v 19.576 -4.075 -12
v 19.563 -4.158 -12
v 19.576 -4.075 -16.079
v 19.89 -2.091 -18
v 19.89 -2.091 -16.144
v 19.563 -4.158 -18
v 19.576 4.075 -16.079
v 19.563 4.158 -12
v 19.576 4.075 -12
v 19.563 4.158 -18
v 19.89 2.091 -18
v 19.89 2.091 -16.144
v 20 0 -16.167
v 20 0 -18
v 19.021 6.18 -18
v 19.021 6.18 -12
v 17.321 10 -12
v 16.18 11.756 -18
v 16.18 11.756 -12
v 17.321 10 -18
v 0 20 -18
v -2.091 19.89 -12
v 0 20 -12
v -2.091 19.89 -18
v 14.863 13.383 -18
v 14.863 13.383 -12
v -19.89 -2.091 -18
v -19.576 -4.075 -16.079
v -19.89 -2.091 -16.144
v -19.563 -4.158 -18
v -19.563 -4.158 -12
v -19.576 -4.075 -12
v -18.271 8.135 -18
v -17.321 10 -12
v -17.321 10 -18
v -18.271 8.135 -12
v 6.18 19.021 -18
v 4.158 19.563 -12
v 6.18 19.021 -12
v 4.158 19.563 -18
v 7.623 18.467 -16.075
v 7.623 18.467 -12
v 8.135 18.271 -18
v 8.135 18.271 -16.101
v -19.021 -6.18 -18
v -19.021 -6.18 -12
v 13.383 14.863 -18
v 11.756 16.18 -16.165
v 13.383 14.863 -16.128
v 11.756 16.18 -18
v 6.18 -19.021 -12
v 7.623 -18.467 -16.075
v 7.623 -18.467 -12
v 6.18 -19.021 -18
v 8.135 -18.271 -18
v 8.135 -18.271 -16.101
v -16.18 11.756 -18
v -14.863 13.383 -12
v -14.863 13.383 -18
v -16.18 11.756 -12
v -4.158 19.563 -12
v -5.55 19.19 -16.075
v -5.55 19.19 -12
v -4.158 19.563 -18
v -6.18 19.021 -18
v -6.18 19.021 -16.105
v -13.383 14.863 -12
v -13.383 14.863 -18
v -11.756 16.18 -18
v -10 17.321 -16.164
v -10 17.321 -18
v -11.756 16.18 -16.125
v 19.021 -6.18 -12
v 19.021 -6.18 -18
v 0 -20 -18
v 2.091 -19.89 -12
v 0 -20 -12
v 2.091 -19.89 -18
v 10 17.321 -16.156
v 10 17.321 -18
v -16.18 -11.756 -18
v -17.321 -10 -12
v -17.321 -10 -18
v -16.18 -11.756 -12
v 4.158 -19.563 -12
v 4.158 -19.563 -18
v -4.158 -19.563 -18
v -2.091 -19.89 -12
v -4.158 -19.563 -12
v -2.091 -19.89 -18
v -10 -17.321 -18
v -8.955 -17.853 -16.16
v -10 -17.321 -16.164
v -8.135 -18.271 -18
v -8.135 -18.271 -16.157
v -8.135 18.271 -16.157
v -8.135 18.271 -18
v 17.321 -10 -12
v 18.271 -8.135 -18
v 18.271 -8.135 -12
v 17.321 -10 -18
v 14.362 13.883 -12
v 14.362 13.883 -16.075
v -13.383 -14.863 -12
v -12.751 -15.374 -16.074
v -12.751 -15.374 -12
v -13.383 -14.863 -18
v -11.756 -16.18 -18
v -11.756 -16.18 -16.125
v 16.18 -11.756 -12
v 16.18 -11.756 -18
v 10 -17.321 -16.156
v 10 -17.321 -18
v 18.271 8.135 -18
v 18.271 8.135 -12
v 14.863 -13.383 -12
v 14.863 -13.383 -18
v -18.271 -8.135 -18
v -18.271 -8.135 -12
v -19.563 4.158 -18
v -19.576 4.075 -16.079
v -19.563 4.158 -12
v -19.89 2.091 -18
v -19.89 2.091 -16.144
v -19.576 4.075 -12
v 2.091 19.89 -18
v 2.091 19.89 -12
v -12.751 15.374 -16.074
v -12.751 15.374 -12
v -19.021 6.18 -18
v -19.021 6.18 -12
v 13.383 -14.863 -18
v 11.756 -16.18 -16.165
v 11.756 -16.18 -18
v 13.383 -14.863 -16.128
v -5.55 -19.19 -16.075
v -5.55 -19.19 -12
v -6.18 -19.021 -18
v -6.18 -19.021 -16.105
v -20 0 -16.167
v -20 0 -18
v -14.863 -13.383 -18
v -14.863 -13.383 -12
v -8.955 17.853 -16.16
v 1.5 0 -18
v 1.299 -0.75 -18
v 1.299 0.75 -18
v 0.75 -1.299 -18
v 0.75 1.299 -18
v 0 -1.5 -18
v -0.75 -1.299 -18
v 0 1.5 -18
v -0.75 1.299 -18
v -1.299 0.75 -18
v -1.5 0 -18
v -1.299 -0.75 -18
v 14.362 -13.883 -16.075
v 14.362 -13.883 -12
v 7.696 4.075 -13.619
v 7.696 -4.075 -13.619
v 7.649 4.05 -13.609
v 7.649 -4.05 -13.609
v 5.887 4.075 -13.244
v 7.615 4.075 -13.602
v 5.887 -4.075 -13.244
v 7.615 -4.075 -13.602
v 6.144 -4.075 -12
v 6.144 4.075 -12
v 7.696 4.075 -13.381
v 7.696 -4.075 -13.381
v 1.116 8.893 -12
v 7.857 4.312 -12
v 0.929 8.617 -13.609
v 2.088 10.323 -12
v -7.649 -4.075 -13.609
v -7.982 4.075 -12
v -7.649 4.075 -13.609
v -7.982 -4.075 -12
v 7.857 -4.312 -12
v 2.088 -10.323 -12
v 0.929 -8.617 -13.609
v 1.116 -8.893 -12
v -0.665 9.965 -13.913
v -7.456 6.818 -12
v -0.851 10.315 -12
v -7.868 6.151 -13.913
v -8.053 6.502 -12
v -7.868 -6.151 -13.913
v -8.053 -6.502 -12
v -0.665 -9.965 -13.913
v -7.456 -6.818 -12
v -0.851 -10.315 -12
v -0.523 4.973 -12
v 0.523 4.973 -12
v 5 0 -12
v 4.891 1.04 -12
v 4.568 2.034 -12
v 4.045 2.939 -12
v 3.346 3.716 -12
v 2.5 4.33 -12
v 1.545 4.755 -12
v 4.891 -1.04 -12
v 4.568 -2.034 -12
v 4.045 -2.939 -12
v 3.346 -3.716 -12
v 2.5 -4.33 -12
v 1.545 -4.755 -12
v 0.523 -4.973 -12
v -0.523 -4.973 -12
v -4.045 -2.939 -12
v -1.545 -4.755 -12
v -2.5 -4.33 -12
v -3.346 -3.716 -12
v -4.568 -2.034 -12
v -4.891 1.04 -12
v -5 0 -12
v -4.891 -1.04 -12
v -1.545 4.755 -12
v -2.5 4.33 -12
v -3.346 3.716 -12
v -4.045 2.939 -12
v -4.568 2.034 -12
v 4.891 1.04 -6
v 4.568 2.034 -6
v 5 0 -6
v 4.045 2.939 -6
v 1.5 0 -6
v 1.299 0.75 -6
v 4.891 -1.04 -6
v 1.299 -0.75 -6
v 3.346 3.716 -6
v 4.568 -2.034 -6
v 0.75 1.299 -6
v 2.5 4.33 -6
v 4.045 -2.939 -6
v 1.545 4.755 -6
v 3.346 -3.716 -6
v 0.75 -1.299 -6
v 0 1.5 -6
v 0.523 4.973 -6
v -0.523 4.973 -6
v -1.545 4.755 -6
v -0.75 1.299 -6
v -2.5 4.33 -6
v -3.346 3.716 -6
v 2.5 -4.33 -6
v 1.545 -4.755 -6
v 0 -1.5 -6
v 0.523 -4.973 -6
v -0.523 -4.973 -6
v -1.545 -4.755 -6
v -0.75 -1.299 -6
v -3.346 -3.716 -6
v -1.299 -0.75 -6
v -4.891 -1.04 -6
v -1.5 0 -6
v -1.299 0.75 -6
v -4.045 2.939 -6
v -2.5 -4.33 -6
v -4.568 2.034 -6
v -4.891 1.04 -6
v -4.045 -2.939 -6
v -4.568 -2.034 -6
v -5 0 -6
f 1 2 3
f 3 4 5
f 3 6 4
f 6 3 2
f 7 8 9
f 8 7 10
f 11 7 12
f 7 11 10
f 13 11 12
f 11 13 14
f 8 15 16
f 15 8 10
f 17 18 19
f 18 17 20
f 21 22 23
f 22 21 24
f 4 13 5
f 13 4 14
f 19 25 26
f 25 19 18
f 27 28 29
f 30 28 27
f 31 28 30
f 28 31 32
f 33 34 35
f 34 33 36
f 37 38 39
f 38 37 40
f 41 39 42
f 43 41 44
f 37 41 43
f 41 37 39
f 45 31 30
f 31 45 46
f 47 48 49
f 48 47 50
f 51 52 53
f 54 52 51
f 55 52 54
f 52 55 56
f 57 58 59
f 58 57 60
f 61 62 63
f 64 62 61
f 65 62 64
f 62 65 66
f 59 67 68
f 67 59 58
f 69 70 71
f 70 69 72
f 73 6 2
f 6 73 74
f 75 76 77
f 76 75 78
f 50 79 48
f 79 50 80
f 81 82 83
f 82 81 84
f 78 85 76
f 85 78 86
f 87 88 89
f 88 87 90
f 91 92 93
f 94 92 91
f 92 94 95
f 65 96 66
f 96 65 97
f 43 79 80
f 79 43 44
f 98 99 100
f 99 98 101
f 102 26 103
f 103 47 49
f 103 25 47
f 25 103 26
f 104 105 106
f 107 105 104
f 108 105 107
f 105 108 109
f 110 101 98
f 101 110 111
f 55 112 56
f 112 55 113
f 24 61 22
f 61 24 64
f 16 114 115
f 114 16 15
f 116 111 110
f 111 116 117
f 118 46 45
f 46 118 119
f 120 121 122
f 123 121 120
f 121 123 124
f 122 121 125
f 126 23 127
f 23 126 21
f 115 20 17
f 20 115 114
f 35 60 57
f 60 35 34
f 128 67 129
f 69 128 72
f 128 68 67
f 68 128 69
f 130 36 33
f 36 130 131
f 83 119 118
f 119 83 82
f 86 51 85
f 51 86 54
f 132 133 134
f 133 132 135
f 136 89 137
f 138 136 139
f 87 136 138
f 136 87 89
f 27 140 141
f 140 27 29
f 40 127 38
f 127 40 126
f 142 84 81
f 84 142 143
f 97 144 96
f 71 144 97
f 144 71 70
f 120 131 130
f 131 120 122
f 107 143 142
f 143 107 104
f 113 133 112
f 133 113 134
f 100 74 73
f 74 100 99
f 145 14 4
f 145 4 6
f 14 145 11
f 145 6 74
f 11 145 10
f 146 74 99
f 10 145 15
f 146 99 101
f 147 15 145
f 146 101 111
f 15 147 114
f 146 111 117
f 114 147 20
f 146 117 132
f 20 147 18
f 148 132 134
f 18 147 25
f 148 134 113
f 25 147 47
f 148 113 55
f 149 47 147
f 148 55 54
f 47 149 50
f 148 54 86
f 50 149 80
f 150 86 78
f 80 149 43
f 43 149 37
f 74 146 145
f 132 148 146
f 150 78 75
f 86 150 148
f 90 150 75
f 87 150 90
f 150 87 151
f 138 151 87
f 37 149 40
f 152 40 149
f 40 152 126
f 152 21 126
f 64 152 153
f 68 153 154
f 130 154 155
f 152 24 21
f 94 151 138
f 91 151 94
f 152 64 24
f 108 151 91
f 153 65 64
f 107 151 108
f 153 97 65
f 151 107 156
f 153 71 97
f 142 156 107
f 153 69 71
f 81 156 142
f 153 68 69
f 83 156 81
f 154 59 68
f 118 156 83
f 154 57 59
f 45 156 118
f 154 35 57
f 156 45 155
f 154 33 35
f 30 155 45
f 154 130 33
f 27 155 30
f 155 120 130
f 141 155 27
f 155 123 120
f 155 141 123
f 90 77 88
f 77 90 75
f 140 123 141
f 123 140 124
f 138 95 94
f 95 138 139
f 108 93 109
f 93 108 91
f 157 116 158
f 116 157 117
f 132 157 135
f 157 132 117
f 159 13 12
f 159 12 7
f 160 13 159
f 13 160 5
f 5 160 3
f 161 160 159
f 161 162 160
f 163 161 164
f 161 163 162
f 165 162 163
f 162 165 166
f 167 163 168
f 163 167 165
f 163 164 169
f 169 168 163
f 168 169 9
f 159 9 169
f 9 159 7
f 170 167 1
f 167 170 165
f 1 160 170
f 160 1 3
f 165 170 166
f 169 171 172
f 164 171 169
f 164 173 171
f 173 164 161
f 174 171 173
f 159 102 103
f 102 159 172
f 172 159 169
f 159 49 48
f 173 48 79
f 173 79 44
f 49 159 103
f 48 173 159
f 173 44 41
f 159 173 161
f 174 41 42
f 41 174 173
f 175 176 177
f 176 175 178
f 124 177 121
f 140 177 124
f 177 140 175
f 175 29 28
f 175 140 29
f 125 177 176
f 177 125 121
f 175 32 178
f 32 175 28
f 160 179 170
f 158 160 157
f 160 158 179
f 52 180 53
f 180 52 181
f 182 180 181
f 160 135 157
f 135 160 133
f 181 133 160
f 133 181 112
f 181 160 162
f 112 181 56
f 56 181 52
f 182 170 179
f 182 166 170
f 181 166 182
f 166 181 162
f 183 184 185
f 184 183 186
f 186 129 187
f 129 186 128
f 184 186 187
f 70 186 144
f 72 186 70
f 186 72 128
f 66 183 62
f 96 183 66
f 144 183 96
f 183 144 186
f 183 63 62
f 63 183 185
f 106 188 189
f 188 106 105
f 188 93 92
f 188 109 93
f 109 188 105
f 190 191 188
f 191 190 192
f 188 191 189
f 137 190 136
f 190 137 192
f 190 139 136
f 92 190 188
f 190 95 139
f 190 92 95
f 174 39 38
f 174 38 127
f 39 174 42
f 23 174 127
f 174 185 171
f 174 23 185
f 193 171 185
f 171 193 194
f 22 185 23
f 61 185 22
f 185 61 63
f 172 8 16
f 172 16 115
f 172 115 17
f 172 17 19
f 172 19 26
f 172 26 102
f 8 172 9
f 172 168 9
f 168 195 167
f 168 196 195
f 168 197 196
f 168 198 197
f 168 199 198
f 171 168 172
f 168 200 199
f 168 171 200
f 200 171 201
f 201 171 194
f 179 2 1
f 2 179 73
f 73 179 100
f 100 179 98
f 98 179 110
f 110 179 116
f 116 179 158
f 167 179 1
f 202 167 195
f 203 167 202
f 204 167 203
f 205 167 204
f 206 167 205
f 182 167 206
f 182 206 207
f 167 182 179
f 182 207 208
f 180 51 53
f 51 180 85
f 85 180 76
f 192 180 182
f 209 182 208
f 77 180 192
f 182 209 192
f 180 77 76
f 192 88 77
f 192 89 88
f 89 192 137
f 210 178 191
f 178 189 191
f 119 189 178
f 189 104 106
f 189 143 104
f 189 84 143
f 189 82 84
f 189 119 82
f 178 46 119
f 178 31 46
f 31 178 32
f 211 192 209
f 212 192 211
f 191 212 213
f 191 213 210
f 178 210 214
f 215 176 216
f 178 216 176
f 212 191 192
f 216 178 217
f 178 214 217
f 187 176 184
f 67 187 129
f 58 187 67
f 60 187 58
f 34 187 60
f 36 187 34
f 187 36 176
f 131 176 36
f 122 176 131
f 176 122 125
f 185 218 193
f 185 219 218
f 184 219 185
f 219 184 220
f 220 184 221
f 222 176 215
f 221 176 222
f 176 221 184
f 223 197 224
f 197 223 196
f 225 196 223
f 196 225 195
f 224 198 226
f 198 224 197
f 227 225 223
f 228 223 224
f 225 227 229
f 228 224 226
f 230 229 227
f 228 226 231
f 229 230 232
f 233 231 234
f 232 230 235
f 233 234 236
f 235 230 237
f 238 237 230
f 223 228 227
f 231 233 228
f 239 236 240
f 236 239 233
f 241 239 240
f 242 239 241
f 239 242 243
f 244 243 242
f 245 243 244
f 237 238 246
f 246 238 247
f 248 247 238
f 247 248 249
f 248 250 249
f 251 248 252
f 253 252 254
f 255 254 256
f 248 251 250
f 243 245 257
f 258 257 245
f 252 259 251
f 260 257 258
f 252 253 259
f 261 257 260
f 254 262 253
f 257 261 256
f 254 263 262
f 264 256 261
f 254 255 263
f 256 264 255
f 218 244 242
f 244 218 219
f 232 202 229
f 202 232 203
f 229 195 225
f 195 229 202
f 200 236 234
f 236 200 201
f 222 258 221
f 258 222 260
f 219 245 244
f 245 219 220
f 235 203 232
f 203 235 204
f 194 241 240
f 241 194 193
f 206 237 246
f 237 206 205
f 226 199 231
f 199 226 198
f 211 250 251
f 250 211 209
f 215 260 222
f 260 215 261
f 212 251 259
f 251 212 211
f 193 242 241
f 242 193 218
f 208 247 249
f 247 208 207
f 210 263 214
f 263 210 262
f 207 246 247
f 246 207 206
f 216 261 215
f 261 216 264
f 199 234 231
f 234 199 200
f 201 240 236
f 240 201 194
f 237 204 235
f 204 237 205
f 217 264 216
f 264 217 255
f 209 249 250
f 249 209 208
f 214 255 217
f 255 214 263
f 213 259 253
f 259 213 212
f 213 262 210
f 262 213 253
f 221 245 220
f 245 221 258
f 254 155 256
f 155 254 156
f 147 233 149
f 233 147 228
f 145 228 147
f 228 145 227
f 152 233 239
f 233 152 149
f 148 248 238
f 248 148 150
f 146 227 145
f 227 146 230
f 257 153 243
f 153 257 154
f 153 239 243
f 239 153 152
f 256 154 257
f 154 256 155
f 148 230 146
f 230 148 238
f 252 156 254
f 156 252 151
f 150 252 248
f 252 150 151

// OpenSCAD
offset=-3;

difference(){
translate([0,0,offset])
cylinder(d=40,h=30,$fn=60,center=true);
cylinder(d=3.7,h=60,$fn=15,center=true);
rotate([0,0,0])//A
rotate([0,11.7,0])translate([18.45,0,0])
cube([20,8.15,23.55],center=true);
rotate([0,0,55.8])//B
rotate([0,11.7,0])translate([20.25,0,0])
cube([20,8.15,23.55],center=true);
rotate([0,0,180])//B
rotate([0,11.7,0])translate([20.25,0,0])
cube([20,8.15,23.55],center=true);
rotate([0,0,-55.8])//B
rotate([0,11.7,0])translate([20.25,0,0])
cube([20,8.15,23.55],center=true);
rotate([0,0,55.8+62.1])//C
rotate([0,11.7,0])translate([21.75,0,0])
cube([20,8.15,23.55],center=true);
rotate([0,0,-55.8-62.1])//C
rotate([0,11.7,0])translate([21.75,0,0])
cube([20,8.15,23.55],center=true);
translate([0,0,-12])cylinder(d=50,h=30);
}
difference(){
translate([0,0,-18])cylinder(d=10,h=12,$fn=30);
cylinder(d=3,h=100,$fn=12,center=true);
}

//difference(){
//translate([0,0,offset])
//cylinder(d=40,h=28,$fn=60,center=true);
//cylinder(d=3.7,h=60,$fn=15,center=true);
//rotate([0,0,0])//A
//rotate([0,11.7,0])translate([18.45,0,0])
//cube([20,8.15,23.55],center=true);
//rotate([0,0,55.8])//B
//rotate([0,11.7,0])translate([20.25,0,0])
//cube([20,8.15,23.55],center=true);
//rotate([0,0,180])//B
//rotate([0,11.7,0])translate([20.25,0,0])
//cube([20,8.15,23.55],center=true);
//rotate([0,0,-55.8])//B
//rotate([0,11.7,0])translate([20.25,0,0])
//cube([20,8.15,23.55],center=true);
//rotate([0,0,55.8+62.1])//C
//rotate([0,11.7,0])translate([21.75,0,0])
//cube([20,8.15,23.55],center=true);
//rotate([0,0,-55.8-62.1])//C
//rotate([0,11.7,0])translate([21.75,0,0])
//cube([20,8.15,23.55],center=true);
//translate([0,0,-23])cylinder(d=50,h=30);
//}

%rotate([0,0,0])
rotate([0,11.7,0])translate([18.45,0,0])
cube([20,8.15,23.55],center=true);
